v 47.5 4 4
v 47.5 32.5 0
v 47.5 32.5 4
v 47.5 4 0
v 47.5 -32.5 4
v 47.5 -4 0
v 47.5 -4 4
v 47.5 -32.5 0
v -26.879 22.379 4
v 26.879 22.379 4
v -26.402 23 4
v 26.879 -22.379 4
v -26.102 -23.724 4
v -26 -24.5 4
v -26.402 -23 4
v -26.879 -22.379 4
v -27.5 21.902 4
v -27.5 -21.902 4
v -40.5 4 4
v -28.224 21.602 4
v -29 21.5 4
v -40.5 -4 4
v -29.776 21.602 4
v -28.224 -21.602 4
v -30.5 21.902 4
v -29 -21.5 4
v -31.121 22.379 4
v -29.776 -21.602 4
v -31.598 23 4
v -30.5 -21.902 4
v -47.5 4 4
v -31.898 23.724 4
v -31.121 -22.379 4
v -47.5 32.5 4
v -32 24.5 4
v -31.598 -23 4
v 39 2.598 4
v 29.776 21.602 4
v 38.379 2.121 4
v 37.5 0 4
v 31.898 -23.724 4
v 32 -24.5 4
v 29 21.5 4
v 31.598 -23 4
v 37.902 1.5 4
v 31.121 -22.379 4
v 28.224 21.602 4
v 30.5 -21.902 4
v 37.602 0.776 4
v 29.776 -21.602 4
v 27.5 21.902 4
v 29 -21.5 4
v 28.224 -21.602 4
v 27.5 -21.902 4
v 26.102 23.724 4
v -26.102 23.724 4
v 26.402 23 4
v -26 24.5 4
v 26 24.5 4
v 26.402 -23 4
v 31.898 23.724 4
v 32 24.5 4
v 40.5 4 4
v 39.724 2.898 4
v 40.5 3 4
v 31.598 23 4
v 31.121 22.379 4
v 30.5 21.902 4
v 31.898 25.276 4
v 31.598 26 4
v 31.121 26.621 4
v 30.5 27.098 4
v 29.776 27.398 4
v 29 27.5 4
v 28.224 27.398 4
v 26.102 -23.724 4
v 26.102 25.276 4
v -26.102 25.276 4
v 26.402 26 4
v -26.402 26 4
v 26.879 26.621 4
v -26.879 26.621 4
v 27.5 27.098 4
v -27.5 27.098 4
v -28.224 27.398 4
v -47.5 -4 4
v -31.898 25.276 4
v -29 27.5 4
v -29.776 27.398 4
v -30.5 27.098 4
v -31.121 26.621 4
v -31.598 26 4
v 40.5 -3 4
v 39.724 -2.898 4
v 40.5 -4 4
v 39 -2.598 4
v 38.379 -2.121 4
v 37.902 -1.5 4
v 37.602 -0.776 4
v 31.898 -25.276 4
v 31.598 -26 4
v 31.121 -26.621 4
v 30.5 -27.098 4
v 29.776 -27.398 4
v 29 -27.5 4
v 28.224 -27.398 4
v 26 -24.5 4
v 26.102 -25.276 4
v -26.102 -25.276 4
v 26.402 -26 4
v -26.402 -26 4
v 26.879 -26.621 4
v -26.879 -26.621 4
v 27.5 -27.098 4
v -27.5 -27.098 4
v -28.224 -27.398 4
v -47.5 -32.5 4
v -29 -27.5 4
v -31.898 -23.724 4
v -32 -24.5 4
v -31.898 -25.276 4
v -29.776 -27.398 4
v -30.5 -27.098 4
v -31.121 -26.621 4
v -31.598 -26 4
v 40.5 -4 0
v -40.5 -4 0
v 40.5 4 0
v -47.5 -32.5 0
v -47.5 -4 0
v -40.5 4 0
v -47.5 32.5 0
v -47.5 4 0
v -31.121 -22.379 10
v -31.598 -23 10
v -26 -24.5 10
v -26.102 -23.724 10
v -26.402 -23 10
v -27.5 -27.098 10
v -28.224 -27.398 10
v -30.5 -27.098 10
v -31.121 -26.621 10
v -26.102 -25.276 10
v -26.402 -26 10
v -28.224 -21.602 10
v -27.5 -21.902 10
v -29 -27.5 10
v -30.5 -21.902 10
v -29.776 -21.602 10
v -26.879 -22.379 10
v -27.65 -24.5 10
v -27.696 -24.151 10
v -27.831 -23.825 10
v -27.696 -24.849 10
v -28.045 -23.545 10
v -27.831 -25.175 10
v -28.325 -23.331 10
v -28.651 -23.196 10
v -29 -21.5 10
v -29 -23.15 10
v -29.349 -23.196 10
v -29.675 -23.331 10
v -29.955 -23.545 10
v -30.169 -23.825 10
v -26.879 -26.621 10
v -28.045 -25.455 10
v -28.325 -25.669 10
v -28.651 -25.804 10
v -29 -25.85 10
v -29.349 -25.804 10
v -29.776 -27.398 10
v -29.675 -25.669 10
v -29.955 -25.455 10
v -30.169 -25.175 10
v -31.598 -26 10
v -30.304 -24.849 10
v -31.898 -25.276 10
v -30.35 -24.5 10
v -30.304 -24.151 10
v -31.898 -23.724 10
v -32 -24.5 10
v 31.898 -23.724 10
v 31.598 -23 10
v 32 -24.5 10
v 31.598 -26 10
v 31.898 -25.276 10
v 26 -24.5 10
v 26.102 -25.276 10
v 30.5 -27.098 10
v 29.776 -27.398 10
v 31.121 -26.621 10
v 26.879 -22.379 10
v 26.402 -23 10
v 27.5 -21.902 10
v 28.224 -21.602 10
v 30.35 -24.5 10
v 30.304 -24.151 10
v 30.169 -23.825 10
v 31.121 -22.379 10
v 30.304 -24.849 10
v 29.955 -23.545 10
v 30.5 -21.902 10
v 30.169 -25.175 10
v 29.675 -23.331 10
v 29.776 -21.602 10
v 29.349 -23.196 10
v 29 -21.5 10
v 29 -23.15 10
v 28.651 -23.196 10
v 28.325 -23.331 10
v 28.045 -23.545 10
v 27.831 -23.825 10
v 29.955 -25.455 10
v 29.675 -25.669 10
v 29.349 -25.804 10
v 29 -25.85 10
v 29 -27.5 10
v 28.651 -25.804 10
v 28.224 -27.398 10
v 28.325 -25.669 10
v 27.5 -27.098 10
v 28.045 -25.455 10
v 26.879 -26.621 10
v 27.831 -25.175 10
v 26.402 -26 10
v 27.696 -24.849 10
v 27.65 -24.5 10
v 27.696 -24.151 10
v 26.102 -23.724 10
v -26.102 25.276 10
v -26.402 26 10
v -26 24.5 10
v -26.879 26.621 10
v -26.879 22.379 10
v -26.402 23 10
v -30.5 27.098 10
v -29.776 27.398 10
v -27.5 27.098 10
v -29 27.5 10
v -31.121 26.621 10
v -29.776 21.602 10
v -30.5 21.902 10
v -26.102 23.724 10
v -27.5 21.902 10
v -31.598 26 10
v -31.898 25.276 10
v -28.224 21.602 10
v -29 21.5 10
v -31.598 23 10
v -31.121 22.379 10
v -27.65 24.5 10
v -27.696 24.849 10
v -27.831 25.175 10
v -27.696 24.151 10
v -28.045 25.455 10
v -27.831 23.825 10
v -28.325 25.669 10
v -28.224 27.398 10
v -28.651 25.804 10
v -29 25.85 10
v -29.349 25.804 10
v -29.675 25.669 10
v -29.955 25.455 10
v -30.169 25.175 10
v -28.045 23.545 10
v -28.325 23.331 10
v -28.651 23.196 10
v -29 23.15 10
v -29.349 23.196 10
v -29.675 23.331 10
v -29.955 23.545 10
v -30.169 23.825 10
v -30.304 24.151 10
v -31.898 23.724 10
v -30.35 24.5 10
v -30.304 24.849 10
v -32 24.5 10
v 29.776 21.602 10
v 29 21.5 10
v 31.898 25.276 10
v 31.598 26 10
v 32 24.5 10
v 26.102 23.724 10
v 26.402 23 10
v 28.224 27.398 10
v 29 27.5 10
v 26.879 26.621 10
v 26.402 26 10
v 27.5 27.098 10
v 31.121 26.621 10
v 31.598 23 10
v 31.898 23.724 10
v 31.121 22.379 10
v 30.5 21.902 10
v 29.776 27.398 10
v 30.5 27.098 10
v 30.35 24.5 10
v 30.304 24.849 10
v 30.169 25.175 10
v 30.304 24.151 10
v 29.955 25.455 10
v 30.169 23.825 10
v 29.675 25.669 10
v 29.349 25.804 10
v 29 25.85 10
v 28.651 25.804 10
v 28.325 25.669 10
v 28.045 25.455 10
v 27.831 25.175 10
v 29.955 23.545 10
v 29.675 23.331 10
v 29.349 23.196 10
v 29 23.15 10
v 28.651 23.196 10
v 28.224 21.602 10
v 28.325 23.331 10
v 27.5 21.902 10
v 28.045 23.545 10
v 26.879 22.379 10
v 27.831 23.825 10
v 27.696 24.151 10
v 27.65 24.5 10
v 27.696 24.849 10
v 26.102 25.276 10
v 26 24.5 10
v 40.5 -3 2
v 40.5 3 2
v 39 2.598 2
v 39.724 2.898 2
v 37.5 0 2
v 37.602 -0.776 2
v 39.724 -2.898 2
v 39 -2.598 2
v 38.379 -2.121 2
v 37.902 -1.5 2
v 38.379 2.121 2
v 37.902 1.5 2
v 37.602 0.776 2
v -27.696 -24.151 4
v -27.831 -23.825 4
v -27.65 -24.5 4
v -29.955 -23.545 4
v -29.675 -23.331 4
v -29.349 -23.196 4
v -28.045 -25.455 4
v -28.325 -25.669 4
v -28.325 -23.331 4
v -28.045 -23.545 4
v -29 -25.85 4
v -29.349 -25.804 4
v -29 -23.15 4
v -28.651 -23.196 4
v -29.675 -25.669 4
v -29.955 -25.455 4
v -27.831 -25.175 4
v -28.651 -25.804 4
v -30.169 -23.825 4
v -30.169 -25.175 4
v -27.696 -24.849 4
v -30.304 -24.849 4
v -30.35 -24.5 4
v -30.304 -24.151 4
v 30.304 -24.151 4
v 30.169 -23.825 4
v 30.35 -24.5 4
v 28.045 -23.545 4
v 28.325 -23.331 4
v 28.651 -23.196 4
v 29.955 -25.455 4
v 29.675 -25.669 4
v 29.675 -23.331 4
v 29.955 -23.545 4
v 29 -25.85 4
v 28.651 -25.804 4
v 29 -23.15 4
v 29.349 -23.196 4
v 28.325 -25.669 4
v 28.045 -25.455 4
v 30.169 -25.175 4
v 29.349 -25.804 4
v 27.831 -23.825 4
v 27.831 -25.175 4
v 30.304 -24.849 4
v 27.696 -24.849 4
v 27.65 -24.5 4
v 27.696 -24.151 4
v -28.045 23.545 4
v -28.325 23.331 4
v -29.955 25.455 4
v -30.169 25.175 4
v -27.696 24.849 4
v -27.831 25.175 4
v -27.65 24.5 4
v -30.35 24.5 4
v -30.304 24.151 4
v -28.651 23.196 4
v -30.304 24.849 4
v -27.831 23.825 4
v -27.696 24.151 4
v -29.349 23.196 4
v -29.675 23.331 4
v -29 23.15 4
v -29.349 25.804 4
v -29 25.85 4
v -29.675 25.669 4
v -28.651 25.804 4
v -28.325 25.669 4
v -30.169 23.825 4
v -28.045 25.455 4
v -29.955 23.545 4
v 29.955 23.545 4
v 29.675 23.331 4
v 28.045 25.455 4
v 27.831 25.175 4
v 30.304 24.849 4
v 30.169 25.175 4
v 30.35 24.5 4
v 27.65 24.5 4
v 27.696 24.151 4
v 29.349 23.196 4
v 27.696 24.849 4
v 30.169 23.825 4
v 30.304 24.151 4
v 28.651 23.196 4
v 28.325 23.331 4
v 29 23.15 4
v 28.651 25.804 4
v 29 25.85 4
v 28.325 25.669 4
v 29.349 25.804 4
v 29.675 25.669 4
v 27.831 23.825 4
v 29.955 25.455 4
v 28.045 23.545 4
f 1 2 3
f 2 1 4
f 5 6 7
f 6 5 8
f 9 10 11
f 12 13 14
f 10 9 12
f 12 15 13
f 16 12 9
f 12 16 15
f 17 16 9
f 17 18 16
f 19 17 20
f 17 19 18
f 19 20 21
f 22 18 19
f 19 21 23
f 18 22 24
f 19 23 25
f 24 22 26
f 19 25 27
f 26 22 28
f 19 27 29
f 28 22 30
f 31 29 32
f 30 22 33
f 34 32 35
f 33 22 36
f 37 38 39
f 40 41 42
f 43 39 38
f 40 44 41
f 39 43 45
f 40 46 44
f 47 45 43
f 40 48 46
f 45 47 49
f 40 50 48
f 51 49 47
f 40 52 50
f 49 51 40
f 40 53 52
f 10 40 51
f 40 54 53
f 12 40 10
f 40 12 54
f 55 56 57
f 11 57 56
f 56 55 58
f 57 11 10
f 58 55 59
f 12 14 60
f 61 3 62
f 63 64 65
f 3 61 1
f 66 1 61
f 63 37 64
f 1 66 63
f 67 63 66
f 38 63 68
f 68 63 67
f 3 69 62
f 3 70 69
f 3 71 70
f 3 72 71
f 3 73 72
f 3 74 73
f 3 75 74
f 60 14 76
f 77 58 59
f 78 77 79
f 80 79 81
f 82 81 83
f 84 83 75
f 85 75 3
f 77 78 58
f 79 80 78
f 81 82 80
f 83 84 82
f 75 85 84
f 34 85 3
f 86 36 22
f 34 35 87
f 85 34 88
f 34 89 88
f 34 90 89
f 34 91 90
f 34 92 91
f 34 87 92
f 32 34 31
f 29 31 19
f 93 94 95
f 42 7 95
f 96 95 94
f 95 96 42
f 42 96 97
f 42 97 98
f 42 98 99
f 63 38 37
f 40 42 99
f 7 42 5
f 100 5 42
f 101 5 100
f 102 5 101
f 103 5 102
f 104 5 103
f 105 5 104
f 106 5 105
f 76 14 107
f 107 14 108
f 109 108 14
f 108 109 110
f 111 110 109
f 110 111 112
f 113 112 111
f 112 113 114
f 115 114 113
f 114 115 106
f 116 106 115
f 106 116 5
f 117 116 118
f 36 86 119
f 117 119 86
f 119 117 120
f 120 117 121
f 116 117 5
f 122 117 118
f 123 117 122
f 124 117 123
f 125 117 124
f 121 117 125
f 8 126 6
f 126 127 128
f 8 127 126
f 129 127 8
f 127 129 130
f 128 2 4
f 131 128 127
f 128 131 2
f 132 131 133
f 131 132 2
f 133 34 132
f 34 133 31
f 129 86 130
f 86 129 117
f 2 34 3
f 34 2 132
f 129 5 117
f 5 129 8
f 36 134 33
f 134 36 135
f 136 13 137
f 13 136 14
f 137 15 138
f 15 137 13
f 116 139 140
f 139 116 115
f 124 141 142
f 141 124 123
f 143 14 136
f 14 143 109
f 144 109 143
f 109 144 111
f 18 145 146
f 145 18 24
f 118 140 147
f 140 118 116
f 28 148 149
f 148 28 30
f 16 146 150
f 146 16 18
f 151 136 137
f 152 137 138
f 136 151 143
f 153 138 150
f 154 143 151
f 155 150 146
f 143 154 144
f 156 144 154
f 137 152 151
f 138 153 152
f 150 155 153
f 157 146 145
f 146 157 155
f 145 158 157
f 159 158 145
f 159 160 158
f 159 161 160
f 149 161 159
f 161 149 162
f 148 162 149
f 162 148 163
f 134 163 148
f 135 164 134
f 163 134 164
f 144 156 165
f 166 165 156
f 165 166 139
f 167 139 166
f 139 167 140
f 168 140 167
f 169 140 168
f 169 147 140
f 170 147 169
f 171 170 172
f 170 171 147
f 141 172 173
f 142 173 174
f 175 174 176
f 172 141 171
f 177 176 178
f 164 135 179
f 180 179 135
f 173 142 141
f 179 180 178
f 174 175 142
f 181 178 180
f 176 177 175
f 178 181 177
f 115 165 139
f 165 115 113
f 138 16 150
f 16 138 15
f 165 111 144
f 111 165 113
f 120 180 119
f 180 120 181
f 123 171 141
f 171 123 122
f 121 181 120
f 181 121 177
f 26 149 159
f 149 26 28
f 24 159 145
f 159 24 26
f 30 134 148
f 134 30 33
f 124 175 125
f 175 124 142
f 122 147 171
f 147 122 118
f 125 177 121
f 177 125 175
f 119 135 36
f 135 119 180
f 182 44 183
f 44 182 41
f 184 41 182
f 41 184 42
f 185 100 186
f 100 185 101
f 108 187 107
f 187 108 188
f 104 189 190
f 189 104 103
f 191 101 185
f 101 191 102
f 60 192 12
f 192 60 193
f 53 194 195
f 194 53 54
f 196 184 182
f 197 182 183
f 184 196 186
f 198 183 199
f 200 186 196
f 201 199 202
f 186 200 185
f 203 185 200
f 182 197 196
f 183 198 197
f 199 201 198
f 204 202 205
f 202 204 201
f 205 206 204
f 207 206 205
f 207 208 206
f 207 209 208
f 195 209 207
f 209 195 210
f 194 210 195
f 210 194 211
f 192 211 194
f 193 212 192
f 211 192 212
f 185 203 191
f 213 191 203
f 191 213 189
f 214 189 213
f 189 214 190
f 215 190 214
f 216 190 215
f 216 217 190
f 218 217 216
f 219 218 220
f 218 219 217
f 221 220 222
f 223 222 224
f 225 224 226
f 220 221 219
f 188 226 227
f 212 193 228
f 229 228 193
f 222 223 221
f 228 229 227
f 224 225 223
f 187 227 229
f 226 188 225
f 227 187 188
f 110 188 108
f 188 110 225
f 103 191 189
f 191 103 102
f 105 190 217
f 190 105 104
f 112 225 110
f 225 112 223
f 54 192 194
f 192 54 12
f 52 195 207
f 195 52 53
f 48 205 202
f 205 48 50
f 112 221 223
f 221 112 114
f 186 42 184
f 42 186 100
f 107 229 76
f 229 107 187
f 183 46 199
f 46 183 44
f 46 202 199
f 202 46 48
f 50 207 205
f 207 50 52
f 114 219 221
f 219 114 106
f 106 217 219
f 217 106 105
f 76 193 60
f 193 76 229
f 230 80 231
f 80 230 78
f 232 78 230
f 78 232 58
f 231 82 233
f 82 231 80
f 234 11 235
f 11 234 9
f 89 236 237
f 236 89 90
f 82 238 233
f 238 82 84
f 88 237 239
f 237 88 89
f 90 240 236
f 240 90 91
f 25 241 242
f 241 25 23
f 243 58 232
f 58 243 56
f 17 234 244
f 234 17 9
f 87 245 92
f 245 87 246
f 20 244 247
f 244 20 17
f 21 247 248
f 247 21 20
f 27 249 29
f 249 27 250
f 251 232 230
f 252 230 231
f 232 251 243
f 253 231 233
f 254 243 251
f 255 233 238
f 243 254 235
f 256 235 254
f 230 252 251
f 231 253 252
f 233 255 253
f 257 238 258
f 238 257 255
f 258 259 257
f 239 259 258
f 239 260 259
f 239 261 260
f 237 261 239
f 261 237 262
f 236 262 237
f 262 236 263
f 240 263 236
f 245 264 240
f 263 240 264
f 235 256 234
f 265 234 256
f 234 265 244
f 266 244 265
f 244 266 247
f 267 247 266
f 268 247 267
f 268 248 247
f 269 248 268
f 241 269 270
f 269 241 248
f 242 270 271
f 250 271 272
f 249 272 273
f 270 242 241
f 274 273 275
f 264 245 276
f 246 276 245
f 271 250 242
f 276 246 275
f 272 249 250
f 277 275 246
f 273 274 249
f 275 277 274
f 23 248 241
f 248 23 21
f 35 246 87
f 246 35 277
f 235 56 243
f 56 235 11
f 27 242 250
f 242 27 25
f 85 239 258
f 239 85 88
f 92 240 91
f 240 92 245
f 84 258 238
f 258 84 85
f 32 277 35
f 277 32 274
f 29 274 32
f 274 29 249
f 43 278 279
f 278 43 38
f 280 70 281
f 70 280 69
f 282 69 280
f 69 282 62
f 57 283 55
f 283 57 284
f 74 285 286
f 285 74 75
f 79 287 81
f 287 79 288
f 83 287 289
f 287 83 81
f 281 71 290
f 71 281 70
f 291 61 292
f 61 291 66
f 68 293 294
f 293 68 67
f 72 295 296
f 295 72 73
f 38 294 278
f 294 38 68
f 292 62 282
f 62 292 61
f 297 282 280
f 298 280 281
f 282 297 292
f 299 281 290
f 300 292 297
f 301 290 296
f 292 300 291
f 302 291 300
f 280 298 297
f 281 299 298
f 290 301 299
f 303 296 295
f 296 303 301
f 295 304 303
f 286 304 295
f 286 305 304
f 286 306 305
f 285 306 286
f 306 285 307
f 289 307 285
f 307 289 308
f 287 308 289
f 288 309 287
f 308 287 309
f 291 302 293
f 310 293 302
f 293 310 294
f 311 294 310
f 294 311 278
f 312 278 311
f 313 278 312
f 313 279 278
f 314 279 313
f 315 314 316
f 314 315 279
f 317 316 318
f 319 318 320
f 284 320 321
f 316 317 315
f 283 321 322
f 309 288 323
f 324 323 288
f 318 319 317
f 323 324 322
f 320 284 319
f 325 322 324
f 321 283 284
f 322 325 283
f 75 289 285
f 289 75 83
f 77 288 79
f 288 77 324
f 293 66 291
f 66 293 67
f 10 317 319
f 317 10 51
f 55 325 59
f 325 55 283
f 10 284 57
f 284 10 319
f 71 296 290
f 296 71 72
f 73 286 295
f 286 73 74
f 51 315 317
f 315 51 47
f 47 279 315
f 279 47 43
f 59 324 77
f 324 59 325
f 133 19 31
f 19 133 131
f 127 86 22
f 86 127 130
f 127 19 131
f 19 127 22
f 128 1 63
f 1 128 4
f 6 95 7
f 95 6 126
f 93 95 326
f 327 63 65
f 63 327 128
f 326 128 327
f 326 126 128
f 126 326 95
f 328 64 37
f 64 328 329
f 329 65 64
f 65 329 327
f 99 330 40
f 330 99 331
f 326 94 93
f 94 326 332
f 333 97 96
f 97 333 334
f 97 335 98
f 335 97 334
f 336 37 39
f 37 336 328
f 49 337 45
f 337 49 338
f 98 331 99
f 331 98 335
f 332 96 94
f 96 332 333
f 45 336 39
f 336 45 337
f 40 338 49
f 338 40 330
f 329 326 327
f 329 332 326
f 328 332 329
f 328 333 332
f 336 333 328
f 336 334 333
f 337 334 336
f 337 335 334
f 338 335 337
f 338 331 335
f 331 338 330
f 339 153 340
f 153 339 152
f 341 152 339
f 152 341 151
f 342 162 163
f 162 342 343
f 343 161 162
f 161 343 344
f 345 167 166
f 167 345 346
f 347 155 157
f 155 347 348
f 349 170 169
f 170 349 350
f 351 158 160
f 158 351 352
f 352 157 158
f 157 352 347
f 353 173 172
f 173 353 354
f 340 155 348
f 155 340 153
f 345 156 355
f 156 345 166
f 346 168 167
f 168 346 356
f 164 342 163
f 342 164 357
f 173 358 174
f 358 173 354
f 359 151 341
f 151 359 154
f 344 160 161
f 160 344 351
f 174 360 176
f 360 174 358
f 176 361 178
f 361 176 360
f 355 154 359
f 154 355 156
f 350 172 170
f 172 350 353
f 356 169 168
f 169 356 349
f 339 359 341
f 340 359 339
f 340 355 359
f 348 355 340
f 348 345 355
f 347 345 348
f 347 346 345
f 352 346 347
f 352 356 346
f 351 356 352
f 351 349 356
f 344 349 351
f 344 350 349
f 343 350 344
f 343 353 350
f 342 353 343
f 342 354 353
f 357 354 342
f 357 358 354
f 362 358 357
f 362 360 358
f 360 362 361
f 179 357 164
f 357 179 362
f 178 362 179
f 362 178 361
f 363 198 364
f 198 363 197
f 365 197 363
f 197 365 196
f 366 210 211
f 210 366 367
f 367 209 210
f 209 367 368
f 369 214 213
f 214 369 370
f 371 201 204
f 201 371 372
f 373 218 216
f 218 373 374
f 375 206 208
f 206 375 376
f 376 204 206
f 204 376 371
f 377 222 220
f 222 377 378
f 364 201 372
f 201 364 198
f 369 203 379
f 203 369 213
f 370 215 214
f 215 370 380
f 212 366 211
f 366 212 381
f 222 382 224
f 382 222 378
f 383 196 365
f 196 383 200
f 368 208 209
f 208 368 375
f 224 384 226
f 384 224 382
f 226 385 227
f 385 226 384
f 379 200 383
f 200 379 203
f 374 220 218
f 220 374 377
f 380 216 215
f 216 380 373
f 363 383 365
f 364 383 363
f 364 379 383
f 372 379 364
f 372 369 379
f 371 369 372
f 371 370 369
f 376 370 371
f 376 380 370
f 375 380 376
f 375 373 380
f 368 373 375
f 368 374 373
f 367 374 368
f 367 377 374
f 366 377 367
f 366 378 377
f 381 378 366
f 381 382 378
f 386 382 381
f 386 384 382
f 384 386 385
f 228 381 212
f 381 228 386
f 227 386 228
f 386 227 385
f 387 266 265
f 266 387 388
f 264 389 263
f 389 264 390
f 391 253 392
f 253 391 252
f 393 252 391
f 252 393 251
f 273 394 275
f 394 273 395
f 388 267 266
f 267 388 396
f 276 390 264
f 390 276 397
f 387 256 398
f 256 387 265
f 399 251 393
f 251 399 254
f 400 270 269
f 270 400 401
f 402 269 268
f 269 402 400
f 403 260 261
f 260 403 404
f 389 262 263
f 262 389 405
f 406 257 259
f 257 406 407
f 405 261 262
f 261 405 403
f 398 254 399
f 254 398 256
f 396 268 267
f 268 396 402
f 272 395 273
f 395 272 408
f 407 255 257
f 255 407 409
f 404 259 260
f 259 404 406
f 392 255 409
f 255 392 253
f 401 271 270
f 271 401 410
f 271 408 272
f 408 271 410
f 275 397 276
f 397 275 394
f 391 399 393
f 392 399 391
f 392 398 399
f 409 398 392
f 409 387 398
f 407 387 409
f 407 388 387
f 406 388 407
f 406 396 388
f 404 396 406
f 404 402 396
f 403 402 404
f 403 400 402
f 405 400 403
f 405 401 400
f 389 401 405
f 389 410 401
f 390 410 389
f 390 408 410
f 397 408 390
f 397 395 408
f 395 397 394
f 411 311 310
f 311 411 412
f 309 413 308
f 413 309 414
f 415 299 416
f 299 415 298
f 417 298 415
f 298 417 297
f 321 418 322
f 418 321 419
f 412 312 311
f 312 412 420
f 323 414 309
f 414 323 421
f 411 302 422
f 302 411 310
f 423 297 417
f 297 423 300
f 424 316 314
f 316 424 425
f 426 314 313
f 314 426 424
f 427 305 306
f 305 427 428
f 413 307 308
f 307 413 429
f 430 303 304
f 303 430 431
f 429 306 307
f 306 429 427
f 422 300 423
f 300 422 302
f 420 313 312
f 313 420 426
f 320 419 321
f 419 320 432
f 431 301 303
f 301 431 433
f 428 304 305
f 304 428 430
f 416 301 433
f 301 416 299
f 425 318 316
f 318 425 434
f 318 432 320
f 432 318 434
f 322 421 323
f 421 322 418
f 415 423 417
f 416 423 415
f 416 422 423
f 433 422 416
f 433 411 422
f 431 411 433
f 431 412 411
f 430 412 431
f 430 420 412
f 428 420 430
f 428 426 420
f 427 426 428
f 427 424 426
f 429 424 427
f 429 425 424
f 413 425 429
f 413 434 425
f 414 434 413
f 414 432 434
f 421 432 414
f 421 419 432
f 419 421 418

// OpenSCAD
$fn = 24;

module base_plate() {
    cube([95, 65, 4], center=true);
}

module standoff(height) {
    cylinder(h=height, r=3, center=false);
}

module clearance_hole() {
    cylinder(h=10, r=1.35, center=false);
}

module keyhole_slot() {
    // Keyhole slot: 8mm wide x 14mm long
    // Composed of: rectangular slot (8x14mm) + hanging hole (6mm dia)
    union() {
        // Main slot opening: 8mm wide x 14mm long
        cube([8, 14, 6], center=true);
        
        // Hanging hole at top of slot: 6mm diameter cylinder
        translate([0, 7, 3]) 
            cylinder(h=6, r=3, center=true);
    }
}

// Calculate mounting hole positions (centered on 58mm x 49mm pattern)
hole_x_offset = 58 / 2;
hole_y_offset = 49 / 2;

difference() {
    union() {
        // Base plate positioned at z=0 to z=4
        translate([0, 0, 2]) base_plate();
        
        // Four standoffs extending from z=4 to z=10
        translate([-hole_x_offset, -hole_y_offset, 4]) 
            standoff(6);
        
        translate([hole_x_offset, -hole_y_offset, 4]) 
            standoff(6);
        
        translate([-hole_x_offset, hole_y_offset, 4]) 
            standoff(6);
        
        translate([hole_x_offset, hole_y_offset, 4]) 
            standoff(6);
    }
    
    // Four clearance holes (M2.5 = 2.7mm) drilled through standoffs and base
    // Positioned at z=4 to cleanly drill through the 6mm standoffs
    translate([-hole_x_offset, -hole_y_offset, 4]) 
        clearance_hole();
    
    translate([hole_x_offset, -hole_y_offset, 4]) 
        clearance_hole();
    
    translate([-hole_x_offset, hole_y_offset, 4]) 
        clearance_hole();
    
    translate([hole_x_offset, hole_y_offset, 4]) 
        clearance_hole();
    
    // Two keyhole slots on short edges (65mm side)
    // Left edge keyhole
    translate([-47.5, 0, 2]) 
        rotate([0, 0, 90])
        keyhole_slot();
    
    // Right edge keyhole
    translate([47.5, 0, 2]) 
        rotate([0, 0, 90])
        keyhole_slot();
}
